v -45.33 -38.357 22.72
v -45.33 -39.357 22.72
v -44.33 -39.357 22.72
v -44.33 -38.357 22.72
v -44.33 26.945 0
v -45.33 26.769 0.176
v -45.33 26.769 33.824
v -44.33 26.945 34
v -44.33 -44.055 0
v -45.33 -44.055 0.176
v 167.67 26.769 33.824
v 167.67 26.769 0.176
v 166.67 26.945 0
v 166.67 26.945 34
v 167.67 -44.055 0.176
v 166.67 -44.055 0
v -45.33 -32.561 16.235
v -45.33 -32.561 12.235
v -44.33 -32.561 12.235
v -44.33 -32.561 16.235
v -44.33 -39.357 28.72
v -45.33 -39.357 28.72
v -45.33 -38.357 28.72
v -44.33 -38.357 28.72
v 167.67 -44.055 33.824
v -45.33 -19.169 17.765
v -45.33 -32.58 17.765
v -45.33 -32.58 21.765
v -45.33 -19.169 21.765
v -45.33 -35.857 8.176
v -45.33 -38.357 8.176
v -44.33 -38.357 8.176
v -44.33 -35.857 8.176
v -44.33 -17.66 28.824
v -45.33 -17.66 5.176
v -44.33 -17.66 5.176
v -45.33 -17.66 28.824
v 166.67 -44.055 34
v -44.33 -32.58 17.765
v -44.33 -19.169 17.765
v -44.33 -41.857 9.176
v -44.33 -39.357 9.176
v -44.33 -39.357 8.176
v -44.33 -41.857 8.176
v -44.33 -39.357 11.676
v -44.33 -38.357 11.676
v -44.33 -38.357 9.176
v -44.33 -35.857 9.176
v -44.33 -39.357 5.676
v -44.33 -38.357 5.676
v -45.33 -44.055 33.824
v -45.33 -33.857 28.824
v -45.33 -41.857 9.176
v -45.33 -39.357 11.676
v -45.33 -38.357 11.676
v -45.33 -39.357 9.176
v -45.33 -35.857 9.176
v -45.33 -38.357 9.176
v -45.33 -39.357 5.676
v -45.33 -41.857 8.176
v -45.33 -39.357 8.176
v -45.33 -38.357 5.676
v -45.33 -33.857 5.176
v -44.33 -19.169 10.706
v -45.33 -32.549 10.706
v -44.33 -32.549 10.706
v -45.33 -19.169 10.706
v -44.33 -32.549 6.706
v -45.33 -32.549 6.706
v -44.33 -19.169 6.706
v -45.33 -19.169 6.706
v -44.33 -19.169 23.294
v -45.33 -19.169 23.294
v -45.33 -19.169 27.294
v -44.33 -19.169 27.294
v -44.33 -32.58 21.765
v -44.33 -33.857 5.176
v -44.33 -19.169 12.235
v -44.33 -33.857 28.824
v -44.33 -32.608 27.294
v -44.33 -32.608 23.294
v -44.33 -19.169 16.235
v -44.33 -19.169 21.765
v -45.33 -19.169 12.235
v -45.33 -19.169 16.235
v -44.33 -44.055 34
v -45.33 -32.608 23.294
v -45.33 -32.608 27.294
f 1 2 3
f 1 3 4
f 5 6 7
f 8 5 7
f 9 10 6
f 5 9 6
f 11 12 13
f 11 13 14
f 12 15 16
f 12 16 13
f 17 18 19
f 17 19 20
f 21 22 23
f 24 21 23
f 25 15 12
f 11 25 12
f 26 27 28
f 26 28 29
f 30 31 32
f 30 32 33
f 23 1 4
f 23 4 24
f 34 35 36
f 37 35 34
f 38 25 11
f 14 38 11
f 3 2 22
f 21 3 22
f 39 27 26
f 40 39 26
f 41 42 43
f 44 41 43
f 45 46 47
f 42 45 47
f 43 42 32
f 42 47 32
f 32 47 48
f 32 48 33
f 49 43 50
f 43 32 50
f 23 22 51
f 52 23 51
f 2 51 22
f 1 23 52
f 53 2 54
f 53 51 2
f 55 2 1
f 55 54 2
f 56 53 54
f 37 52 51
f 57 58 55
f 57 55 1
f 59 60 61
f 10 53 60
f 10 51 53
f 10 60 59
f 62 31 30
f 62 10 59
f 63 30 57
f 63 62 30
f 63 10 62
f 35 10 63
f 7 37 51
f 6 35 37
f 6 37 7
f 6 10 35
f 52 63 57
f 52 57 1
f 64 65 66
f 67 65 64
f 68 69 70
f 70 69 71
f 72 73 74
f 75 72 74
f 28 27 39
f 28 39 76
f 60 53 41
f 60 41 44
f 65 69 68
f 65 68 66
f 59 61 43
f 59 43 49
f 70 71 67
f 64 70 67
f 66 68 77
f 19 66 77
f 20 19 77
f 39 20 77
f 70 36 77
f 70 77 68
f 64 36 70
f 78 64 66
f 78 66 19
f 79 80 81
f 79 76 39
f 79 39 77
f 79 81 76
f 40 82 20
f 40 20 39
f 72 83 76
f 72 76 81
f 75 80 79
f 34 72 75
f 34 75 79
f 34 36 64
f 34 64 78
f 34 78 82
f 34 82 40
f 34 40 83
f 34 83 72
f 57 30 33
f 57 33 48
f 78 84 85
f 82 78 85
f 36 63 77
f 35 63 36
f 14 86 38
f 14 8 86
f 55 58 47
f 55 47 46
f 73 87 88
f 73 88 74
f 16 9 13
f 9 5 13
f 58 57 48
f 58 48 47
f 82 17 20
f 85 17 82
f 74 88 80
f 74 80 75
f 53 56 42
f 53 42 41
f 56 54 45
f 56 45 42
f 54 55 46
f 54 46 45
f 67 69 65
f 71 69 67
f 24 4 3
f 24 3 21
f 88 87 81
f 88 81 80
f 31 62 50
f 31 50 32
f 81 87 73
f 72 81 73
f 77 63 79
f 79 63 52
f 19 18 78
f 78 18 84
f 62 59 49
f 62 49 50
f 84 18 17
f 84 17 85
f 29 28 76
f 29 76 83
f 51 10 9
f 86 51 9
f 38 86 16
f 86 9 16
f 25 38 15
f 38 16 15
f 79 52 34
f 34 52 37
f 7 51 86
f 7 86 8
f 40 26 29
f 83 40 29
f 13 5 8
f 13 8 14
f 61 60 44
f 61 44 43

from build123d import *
from OCP.BRepFilletAPI import BRepFilletAPI_MakeChamfer

# Parameters (mm, degrees)
SKETCH1_W           = 213
SKETCH1_H           = 71
BOSS_EXTRUDE1_DEPTH = 34
CHAMFER1_SIZE       = 1
CHAMFER1_SIZE2      = 0.176326981
CHAMFER2_SIZE       = 1
CHAMFER2_SIZE2      = 0.176326981
SKETCH3_W           = 23.647346038
SKETCH3_H           = 16.197572193
SKETCH3_W_2         = 4
SKETCH3_H_2         = 13.380603116
SKETCH3_H_3         = 13.392122804
SKETCH3_H_4         = 13.411553204
SKETCH3_H_5         = 13.439263392
CUT_EXTRUDE2_DEPTH  = 1
SKETCH4_W           = 6
SKETCH4_H           = 1
CUT_EXTRUDE3_DEPTH  = 1


with BuildPart() as part:
    # Sketch1 → Boss-Extrude1 (new body)
    with BuildSketch(Plane.XY):
        with Locations((61.169898141, -8.554853616)):
            Rectangle(SKETCH1_W, SKETCH1_H)
    extrude(amount=BOSS_EXTRUDE1_DEPTH)

    # Chamfer1: one chamfer whose edges measure the first distance from different faces: ONE call of the kernel's chamfer builder (chamfer() names one face for all edges)
    chamfer1_edges_1 = [part.edges().sort_by_distance(p)[0] for p in [
        (-45.330101859, -8.554853616, 34),
    ]]
    chamfer1_side_1 = [part.faces().sort_by_distance(p)[0] for p in [
        (61.169898141, -8.554853616, 34),
    ]]
    chamfer1_edges_2 = [part.edges().sort_by_distance(p)[0] for p in [
        (-45.330101859, -8.554853616, 0),
    ]]
    chamfer1_side_2 = [part.faces().sort_by_distance(p)[0] for p in [
        (61.169898141, -8.554853616, 0),
    ]]
    chamfer1_edges_3 = [part.edges().sort_by_distance(p)[0] for p in [
        (-45.330101859, 26.945146384, 17),
    ]]
    chamfer1_side_3 = [part.faces().sort_by_distance(p)[0] for p in [
        (61.169898141, 26.945146384, 17),
    ]]
    chamfer1 = BRepFilletAPI_MakeChamfer(part.part.solid().wrapped)
    for e in chamfer1_edges_1:
        chamfer1.Add(CHAMFER1_SIZE, CHAMFER1_SIZE2, e.wrapped, chamfer1_side_1[0].wrapped)  # the first distance lies on this face
    for e in chamfer1_edges_2:
        chamfer1.Add(CHAMFER1_SIZE, CHAMFER1_SIZE2, e.wrapped, chamfer1_side_2[0].wrapped)  # the first distance lies on this face
    for e in chamfer1_edges_3:
        chamfer1.Add(CHAMFER1_SIZE, CHAMFER1_SIZE2, e.wrapped, chamfer1_side_3[0].wrapped)  # the first distance lies on this face
    add(Compound.cast(chamfer1.Shape()), mode=Mode.REPLACE)

    # Chamfer2: one chamfer whose edges measure the first distance from different faces: ONE call of the kernel's chamfer builder (chamfer() names one face for all edges)
    chamfer2_edges_1 = [part.edges().sort_by_distance(p)[0] for p in [
        (167.669898141, -8.554853616, 34),
    ]]
    chamfer2_side_1 = [part.faces().sort_by_distance(p)[0] for p in [
        (61.669898141, -8.554853616, 34),
    ]]
    chamfer2_edges_2 = [part.edges().sort_by_distance(p)[0] for p in [
        (167.669898141, -8.554853616, 0),
    ]]
    chamfer2_side_2 = [part.faces().sort_by_distance(p)[0] for p in [
        (61.669898141, -8.554853616, 0),
    ]]
    chamfer2_edges_3 = [part.edges().sort_by_distance(p)[0] for p in [
        (167.669898141, 26.945146384, 17),
    ]]
    chamfer2_side_3 = [part.faces().sort_by_distance(p)[0] for p in [
        (61.669898141, 26.945146384, 17),
    ]]
    chamfer2 = BRepFilletAPI_MakeChamfer(part.part.solid().wrapped)
    for e in chamfer2_edges_1:
        chamfer2.Add(CHAMFER2_SIZE, CHAMFER2_SIZE2, e.wrapped, chamfer2_side_1[0].wrapped)  # the first distance lies on this face
    for e in chamfer2_edges_2:
        chamfer2.Add(CHAMFER2_SIZE, CHAMFER2_SIZE2, e.wrapped, chamfer2_side_2[0].wrapped)  # the first distance lies on this face
    for e in chamfer2_edges_3:
        chamfer2.Add(CHAMFER2_SIZE, CHAMFER2_SIZE2, e.wrapped, chamfer2_side_3[0].wrapped)  # the first distance lies on this face
    add(Compound.cast(chamfer2.Shape()), mode=Mode.REPLACE)

    # Sketch3 → Cut-Extrude2 (cut)
    with BuildSketch(Plane.ZY.offset(45.330101859)):
        with Locations((17, -25.758486194)):
            Rectangle(SKETCH3_W, SKETCH3_H)
        with Locations((8.705796188, -25.859092232)):
            Rectangle(SKETCH3_W_2, SKETCH3_H_2, mode=Mode.SUBTRACT)
        with Locations((14.235265396, -25.864852076)):
            Rectangle(SKETCH3_W_2, SKETCH3_H_3, mode=Mode.SUBTRACT)
        with Locations((19.764734604, -25.874567276)):
            Rectangle(SKETCH3_W_2, SKETCH3_H_4, mode=Mode.SUBTRACT)
        with Locations((25.294203812, -25.88842237)):
            Rectangle(SKETCH3_W_2, SKETCH3_H_5, mode=Mode.SUBTRACT)
    extrude(amount=-CUT_EXTRUDE2_DEPTH, mode=Mode.SUBTRACT)

    # Sketch4 → Cut-Extrude3 (cut)
    with BuildSketch(Plane.ZY.offset(45.330101859)):
        Polygon((8.176326981, -35.85727229), (9.176326981, -35.85727229), (9.176326981, -38.35727229), (11.676326981, -38.35727229), (11.676326981, -39.35727229), (9.176326981, -39.35727229), (9.176326981, -41.85727229), (8.176326981, -41.85727229), (8.176326981, -39.35727229), (5.676326981, -39.35727229), (5.676326981, -38.35727229), (8.176326981, -38.35727229), align=None)
        with Locations((25.720428724, -38.85727229)):
            Rectangle(SKETCH4_W, SKETCH4_H)
    extrude(amount=-CUT_EXTRUDE3_DEPTH, mode=Mode.SUBTRACT)


solid = part.part
